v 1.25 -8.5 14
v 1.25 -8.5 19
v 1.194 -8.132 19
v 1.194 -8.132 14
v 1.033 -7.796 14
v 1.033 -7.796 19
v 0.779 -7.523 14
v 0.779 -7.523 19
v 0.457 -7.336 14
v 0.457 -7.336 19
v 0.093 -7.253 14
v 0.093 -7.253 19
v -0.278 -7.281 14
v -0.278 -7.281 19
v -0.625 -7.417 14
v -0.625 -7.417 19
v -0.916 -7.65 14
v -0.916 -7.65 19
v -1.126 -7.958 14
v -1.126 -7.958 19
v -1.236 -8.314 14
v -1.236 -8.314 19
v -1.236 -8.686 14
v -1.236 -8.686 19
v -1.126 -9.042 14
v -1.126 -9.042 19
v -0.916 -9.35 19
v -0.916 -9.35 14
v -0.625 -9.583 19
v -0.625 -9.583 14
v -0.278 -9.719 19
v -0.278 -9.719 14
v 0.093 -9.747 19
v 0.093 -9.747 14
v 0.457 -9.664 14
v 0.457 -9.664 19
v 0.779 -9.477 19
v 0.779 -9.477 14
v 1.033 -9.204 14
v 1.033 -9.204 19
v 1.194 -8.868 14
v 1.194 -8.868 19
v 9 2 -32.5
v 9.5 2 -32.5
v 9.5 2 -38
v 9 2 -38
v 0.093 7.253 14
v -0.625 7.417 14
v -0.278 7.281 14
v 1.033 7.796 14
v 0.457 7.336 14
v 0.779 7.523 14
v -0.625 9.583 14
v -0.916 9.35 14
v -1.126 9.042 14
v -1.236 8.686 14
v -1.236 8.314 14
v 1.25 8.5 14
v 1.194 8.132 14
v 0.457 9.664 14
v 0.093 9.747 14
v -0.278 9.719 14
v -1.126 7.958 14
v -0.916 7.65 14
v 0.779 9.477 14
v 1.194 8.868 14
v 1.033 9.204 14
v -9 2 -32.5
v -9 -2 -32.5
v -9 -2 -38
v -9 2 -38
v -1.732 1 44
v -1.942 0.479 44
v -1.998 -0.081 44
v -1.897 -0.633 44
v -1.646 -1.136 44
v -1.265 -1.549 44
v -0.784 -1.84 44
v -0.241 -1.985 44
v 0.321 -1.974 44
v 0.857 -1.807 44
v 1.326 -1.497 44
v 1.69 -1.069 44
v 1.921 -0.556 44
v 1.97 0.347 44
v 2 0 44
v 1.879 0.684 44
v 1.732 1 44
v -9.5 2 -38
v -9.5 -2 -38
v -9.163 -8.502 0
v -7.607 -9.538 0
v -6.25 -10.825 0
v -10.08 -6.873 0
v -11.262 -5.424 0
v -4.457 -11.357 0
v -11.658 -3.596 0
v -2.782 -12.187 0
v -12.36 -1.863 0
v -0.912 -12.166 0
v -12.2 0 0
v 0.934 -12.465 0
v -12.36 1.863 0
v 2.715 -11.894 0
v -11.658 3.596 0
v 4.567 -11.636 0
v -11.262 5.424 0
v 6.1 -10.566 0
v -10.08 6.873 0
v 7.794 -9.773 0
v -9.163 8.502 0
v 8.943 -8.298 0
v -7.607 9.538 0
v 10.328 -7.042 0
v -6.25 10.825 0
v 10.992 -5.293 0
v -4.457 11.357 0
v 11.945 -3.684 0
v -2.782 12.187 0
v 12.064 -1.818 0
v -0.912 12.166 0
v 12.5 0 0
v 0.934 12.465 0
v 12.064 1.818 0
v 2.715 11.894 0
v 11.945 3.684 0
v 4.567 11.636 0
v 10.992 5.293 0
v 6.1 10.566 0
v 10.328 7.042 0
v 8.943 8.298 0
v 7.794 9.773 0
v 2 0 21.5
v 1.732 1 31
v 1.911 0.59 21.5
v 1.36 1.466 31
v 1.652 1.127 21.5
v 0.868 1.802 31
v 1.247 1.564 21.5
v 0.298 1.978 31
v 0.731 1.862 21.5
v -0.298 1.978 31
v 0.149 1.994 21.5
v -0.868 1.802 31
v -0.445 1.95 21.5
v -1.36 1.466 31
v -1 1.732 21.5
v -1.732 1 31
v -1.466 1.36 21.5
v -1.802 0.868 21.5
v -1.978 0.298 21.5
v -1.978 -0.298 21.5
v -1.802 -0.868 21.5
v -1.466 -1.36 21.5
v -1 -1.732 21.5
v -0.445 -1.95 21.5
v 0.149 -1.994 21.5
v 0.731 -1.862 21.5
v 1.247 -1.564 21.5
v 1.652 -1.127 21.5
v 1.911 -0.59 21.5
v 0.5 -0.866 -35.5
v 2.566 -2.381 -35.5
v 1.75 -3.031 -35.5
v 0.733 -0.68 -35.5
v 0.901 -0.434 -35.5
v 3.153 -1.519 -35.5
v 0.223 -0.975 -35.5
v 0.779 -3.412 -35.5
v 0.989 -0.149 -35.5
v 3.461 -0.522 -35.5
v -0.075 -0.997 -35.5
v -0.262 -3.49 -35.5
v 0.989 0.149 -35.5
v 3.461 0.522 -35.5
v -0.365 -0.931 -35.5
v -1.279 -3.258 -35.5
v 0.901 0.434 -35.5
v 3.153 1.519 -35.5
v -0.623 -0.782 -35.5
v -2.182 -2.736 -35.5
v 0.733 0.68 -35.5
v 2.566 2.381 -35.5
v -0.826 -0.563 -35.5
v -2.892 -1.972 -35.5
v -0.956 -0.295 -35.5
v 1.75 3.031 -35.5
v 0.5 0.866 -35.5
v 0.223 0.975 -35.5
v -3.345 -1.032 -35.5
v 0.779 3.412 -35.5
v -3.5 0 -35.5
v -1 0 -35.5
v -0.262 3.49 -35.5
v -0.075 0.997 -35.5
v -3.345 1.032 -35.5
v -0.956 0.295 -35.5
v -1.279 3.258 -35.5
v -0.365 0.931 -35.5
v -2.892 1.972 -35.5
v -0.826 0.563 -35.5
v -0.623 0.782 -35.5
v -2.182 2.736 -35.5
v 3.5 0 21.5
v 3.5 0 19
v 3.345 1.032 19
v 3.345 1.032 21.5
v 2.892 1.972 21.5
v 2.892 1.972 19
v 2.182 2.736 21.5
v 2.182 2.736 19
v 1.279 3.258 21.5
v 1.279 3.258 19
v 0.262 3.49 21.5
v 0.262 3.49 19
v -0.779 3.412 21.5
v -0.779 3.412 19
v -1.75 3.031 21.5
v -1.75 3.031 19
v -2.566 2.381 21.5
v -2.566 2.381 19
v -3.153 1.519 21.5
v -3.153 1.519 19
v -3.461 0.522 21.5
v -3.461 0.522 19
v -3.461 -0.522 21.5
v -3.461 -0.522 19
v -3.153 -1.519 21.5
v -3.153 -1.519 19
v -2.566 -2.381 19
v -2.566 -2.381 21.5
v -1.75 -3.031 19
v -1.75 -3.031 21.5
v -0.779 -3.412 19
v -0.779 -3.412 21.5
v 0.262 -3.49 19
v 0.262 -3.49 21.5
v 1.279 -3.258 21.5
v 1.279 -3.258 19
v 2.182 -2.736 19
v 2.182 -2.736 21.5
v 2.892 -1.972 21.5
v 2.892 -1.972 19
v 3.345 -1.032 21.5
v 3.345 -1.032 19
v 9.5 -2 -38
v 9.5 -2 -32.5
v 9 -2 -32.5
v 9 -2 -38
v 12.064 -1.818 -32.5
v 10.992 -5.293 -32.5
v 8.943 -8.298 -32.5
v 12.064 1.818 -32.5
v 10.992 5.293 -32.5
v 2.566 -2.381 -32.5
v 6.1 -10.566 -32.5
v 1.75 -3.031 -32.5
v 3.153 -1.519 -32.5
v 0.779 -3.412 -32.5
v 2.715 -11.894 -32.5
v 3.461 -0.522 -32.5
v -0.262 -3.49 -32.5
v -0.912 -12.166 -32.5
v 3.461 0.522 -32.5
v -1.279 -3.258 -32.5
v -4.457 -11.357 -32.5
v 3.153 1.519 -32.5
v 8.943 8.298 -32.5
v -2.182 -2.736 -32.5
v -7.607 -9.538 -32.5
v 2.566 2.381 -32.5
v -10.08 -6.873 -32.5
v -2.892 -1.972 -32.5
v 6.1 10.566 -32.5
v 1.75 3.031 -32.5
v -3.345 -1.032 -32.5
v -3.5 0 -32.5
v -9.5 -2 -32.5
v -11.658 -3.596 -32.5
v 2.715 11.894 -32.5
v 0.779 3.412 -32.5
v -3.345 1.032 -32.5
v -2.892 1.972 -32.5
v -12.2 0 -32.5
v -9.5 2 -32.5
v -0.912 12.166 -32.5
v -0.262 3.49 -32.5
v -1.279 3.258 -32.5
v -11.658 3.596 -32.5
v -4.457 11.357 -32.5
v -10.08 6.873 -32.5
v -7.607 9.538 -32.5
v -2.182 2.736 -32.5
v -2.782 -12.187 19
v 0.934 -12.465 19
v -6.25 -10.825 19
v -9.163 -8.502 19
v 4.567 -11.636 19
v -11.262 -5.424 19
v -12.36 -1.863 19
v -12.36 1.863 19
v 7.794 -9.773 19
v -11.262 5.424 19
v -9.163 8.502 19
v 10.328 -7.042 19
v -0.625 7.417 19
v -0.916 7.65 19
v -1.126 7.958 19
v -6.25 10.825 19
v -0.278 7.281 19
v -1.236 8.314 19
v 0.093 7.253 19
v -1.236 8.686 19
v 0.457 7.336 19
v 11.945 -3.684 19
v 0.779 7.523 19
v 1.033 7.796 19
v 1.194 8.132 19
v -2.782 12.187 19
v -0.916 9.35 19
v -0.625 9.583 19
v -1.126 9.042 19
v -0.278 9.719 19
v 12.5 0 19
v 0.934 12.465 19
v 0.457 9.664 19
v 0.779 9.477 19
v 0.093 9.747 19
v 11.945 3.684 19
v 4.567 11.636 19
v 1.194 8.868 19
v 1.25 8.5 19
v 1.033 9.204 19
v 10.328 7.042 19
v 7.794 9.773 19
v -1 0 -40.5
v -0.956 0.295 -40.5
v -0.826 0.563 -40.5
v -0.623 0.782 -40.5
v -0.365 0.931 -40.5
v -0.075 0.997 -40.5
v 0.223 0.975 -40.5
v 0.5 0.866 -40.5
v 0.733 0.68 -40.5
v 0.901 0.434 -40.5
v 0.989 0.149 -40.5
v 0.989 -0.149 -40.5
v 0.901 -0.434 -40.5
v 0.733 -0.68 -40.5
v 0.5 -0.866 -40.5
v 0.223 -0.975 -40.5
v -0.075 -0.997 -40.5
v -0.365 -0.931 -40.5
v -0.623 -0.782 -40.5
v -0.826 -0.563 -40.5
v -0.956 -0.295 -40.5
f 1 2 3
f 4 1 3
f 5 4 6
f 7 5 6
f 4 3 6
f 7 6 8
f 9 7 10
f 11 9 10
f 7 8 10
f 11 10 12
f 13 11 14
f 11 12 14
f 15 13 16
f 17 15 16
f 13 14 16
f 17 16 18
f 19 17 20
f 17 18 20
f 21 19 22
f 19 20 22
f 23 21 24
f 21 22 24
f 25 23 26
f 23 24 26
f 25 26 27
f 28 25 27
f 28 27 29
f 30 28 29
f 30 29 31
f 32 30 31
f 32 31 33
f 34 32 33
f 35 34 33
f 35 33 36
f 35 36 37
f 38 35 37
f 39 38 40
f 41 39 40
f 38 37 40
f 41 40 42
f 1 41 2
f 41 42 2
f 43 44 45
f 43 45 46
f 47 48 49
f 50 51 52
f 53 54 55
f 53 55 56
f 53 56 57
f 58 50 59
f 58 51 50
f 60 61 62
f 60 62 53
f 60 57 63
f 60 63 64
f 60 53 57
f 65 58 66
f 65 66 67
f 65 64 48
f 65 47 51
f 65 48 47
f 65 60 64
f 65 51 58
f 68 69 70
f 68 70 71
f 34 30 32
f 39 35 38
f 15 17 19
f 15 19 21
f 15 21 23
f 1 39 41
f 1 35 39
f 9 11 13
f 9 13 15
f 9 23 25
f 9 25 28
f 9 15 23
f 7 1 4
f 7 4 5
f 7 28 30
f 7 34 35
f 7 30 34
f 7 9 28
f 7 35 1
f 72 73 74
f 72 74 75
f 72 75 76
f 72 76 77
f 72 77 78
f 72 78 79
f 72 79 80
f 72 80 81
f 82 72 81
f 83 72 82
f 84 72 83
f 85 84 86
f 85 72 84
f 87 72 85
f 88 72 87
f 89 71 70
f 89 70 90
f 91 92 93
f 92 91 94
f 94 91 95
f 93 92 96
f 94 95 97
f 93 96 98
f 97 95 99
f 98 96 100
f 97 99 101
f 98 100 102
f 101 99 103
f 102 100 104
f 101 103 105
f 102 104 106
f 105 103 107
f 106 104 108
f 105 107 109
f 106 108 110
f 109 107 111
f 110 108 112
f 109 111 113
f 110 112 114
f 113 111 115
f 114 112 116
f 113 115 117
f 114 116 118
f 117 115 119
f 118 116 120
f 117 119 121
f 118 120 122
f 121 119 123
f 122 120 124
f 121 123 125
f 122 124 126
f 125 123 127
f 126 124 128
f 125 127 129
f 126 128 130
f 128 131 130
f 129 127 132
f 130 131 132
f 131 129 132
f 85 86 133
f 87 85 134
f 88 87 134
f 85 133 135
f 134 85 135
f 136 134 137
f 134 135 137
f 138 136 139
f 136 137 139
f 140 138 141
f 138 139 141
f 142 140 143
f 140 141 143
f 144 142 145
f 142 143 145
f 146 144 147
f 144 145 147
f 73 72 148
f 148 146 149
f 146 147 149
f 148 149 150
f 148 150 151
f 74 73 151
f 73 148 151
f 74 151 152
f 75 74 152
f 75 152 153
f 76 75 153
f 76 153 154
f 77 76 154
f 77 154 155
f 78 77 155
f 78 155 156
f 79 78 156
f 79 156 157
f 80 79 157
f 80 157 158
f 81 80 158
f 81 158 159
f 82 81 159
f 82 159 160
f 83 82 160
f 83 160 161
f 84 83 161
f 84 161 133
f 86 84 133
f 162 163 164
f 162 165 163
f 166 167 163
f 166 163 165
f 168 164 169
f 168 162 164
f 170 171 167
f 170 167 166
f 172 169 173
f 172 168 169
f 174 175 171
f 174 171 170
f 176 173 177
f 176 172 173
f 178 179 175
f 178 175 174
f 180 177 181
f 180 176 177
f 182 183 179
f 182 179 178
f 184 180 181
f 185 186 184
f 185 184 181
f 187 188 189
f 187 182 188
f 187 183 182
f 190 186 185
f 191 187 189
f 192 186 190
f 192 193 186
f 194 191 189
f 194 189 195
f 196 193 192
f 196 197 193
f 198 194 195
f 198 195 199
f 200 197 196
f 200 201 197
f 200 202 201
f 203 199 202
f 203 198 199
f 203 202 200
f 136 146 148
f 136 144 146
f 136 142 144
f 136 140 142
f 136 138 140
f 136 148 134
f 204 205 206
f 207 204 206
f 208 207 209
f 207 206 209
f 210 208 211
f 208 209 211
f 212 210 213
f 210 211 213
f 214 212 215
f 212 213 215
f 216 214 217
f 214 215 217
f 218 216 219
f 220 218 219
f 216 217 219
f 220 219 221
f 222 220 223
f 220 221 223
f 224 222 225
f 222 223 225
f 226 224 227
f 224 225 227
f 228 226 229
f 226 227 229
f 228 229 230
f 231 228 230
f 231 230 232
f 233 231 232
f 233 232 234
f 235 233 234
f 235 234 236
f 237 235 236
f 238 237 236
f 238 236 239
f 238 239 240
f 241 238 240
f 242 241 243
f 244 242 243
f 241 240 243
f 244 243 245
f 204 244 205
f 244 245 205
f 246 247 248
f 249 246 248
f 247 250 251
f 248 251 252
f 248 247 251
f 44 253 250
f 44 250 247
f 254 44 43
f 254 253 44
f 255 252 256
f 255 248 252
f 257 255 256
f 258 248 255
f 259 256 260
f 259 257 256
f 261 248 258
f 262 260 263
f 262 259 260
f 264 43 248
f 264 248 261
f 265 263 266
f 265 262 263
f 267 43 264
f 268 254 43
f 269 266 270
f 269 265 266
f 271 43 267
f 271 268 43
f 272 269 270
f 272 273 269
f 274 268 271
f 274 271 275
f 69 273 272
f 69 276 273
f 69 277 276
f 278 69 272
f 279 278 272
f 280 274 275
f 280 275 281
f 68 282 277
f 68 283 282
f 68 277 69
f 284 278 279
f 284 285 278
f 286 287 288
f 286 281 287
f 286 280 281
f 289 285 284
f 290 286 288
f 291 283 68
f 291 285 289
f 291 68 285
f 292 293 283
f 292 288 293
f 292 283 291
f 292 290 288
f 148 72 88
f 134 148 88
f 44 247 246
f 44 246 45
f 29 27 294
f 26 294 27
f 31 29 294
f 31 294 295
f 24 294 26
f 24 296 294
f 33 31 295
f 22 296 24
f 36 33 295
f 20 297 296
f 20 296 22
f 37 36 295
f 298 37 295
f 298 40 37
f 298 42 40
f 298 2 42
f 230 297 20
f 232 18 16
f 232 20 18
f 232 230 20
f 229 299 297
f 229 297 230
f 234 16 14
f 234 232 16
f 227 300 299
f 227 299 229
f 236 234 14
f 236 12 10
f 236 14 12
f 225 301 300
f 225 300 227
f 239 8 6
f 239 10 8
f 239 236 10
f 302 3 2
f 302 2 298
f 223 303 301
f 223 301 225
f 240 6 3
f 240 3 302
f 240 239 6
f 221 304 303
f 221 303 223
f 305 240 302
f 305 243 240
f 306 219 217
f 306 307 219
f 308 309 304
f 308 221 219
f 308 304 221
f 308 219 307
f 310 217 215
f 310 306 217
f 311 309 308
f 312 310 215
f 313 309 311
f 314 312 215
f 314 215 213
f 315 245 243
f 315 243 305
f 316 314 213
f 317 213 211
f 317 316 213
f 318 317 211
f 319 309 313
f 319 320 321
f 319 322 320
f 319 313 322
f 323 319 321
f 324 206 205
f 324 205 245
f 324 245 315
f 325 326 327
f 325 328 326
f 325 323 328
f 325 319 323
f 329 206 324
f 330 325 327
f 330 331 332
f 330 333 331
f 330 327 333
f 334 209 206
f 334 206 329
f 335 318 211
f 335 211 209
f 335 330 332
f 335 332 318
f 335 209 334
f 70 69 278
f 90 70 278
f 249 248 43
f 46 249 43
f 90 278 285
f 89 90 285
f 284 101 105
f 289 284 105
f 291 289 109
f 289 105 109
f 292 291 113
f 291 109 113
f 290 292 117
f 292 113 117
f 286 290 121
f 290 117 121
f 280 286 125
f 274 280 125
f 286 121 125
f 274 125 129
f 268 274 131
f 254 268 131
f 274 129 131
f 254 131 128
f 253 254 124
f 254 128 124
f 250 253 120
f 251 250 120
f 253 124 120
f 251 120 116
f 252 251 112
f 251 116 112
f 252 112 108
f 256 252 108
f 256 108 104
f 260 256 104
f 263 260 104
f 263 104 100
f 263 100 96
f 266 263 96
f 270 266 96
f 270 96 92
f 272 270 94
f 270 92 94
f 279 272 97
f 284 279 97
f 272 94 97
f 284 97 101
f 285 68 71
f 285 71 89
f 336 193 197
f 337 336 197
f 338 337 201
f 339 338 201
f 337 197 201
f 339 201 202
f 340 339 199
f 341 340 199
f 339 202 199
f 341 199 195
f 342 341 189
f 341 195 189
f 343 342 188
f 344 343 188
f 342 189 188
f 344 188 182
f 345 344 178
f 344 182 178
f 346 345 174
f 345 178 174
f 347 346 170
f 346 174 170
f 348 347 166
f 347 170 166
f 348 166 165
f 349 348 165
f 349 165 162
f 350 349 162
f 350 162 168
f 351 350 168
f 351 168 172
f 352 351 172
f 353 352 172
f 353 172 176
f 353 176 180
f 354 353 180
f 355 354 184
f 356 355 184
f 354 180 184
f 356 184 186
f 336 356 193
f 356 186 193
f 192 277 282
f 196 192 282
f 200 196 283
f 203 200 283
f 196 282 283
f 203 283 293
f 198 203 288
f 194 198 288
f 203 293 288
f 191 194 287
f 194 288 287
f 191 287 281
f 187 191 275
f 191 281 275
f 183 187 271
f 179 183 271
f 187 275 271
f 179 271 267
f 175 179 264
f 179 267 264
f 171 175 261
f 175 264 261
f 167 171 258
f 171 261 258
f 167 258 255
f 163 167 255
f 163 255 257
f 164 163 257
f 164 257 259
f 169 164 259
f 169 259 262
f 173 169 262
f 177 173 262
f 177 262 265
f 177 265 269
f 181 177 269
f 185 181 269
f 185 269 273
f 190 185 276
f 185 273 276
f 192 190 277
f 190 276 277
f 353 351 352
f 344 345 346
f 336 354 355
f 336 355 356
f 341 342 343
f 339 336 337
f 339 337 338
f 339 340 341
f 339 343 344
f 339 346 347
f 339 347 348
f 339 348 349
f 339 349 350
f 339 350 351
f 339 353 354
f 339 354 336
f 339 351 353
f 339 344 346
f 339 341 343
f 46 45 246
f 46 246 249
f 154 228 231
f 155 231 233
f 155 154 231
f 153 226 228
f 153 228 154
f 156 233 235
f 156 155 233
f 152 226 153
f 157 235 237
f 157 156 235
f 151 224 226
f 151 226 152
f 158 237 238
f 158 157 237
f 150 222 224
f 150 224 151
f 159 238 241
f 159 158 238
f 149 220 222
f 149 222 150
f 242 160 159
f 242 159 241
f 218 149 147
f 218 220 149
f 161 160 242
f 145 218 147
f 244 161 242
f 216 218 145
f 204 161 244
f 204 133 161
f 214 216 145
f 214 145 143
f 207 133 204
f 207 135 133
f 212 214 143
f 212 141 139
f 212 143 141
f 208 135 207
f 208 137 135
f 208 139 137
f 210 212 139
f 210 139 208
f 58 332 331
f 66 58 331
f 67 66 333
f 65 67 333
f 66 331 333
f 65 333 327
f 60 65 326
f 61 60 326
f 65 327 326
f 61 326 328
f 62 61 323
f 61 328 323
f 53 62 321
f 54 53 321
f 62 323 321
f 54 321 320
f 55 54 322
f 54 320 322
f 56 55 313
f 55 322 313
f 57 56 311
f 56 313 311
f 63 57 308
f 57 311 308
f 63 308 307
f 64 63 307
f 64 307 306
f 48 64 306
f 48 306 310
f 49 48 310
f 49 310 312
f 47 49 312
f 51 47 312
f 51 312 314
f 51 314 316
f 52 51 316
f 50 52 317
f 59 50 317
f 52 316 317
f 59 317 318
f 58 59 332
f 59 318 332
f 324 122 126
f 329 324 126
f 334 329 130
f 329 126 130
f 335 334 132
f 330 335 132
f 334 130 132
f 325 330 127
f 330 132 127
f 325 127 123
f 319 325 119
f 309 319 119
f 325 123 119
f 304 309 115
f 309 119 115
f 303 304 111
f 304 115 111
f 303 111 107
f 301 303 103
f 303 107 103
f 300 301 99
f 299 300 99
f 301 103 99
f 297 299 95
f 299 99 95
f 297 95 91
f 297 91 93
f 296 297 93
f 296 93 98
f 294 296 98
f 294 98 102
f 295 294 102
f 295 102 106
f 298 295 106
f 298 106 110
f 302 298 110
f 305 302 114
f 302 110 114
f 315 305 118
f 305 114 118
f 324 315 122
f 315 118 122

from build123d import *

# Parameters (mm, degrees)
SKETCH_1_R          = 12.5
EXTRUDE_1_DEPTH     = 19
SKETCH_2_R          = 3.5
EXTRUDE_2_DEPTH     = 2.5
SKETCH_3_R          = 2
EXTRUDE_3_DEPTH     = 22.5
SKETCH_4_W          = 6.562487183
SKETCH_4_H          = 1.182107807
CUT_EXTRUDE_1_DEPTH = 13
SKETCH_5_R          = 12.2
EXTRUDE_5_DEPTH     = 32.5
SKETCH_6_R          = 3.5
EXTRUDE_6_DEPTH     = 3
SKETCH_7_R          = 1
EXTRUDE_7_DEPTH     = 5
SKETCH_8_R          = 1.25
CUT_EXTRUDE_2_DEPTH = 5
SKETCH_9_W          = 0.5
SKETCH_9_H          = 4
EXTRUDE_8_DEPTH     = 5.5


with BuildPart() as part:
    # 스케치1 → 보스-돌출1 (new body)
    with BuildSketch(Plane.XY):
        Circle(SKETCH_1_R)
    extrude(amount=EXTRUDE_1_DEPTH)

    # 스케치2 → 보스-돌출2 (add)
    with BuildSketch(Plane.XY.offset(19)):
        Circle(SKETCH_2_R)
    extrude(amount=EXTRUDE_2_DEPTH)

    # 스케치3 → 보스-돌출3 (add)
    with BuildSketch(Plane.XY.offset(21.5)):
        Circle(SKETCH_3_R)
    extrude(amount=EXTRUDE_3_DEPTH)

    # 스케치4 → 컷-돌출1 (cut)
    with BuildSketch(Plane.XY.offset(44)):
        with Locations((0.048491285, 1.591053903)):
            Rectangle(SKETCH_4_W, SKETCH_4_H)
    extrude(amount=-CUT_EXTRUDE_1_DEPTH, mode=Mode.SUBTRACT)

    # 스케치5 → 보스-돌출5 (add)
    with BuildSketch(Plane(origin=(0, 0, 0), x_dir=(-1, 0, 0), z_dir=(0, 0, -1))):
        Circle(SKETCH_5_R)
    extrude(amount=EXTRUDE_5_DEPTH)

    # 스케치6 → 보스-돌출6 (add)
    with BuildSketch(Plane(origin=(0, 0, -32.5), x_dir=(-1, 0, 0), z_dir=(0, 0, -1))):
        Circle(SKETCH_6_R)
    extrude(amount=EXTRUDE_6_DEPTH)

    # 스케치7 → 보스-돌출7 (add)
    with BuildSketch(Plane(origin=(0, 0, -35.5), x_dir=(-1, 0, 0), z_dir=(0, 0, -1))):
        Circle(SKETCH_7_R)
    extrude(amount=EXTRUDE_7_DEPTH)

    # 스케치8 → 컷-돌출2 (cut)
    with BuildSketch(Plane.XY.offset(19)):
        with Locations((0, 8.5)):
            Circle(SKETCH_8_R)
        with Locations((0, -8.5)):
            Circle(SKETCH_8_R)
    extrude(amount=-CUT_EXTRUDE_2_DEPTH, mode=Mode.SUBTRACT)

    # 스케치9 → 보스-돌출8 (add)
    with BuildSketch(Plane(origin=(0, 0, -32.5), x_dir=(-1, 0, 0), z_dir=(0, 0, -1))):
        with Locations((-9.25, 0)):
            Rectangle(SKETCH_9_W, SKETCH_9_H)
        with Locations((9.25, 0)):
            Rectangle(SKETCH_9_W, SKETCH_9_H)
    extrude(amount=EXTRUDE_8_DEPTH)


solid = part.part
